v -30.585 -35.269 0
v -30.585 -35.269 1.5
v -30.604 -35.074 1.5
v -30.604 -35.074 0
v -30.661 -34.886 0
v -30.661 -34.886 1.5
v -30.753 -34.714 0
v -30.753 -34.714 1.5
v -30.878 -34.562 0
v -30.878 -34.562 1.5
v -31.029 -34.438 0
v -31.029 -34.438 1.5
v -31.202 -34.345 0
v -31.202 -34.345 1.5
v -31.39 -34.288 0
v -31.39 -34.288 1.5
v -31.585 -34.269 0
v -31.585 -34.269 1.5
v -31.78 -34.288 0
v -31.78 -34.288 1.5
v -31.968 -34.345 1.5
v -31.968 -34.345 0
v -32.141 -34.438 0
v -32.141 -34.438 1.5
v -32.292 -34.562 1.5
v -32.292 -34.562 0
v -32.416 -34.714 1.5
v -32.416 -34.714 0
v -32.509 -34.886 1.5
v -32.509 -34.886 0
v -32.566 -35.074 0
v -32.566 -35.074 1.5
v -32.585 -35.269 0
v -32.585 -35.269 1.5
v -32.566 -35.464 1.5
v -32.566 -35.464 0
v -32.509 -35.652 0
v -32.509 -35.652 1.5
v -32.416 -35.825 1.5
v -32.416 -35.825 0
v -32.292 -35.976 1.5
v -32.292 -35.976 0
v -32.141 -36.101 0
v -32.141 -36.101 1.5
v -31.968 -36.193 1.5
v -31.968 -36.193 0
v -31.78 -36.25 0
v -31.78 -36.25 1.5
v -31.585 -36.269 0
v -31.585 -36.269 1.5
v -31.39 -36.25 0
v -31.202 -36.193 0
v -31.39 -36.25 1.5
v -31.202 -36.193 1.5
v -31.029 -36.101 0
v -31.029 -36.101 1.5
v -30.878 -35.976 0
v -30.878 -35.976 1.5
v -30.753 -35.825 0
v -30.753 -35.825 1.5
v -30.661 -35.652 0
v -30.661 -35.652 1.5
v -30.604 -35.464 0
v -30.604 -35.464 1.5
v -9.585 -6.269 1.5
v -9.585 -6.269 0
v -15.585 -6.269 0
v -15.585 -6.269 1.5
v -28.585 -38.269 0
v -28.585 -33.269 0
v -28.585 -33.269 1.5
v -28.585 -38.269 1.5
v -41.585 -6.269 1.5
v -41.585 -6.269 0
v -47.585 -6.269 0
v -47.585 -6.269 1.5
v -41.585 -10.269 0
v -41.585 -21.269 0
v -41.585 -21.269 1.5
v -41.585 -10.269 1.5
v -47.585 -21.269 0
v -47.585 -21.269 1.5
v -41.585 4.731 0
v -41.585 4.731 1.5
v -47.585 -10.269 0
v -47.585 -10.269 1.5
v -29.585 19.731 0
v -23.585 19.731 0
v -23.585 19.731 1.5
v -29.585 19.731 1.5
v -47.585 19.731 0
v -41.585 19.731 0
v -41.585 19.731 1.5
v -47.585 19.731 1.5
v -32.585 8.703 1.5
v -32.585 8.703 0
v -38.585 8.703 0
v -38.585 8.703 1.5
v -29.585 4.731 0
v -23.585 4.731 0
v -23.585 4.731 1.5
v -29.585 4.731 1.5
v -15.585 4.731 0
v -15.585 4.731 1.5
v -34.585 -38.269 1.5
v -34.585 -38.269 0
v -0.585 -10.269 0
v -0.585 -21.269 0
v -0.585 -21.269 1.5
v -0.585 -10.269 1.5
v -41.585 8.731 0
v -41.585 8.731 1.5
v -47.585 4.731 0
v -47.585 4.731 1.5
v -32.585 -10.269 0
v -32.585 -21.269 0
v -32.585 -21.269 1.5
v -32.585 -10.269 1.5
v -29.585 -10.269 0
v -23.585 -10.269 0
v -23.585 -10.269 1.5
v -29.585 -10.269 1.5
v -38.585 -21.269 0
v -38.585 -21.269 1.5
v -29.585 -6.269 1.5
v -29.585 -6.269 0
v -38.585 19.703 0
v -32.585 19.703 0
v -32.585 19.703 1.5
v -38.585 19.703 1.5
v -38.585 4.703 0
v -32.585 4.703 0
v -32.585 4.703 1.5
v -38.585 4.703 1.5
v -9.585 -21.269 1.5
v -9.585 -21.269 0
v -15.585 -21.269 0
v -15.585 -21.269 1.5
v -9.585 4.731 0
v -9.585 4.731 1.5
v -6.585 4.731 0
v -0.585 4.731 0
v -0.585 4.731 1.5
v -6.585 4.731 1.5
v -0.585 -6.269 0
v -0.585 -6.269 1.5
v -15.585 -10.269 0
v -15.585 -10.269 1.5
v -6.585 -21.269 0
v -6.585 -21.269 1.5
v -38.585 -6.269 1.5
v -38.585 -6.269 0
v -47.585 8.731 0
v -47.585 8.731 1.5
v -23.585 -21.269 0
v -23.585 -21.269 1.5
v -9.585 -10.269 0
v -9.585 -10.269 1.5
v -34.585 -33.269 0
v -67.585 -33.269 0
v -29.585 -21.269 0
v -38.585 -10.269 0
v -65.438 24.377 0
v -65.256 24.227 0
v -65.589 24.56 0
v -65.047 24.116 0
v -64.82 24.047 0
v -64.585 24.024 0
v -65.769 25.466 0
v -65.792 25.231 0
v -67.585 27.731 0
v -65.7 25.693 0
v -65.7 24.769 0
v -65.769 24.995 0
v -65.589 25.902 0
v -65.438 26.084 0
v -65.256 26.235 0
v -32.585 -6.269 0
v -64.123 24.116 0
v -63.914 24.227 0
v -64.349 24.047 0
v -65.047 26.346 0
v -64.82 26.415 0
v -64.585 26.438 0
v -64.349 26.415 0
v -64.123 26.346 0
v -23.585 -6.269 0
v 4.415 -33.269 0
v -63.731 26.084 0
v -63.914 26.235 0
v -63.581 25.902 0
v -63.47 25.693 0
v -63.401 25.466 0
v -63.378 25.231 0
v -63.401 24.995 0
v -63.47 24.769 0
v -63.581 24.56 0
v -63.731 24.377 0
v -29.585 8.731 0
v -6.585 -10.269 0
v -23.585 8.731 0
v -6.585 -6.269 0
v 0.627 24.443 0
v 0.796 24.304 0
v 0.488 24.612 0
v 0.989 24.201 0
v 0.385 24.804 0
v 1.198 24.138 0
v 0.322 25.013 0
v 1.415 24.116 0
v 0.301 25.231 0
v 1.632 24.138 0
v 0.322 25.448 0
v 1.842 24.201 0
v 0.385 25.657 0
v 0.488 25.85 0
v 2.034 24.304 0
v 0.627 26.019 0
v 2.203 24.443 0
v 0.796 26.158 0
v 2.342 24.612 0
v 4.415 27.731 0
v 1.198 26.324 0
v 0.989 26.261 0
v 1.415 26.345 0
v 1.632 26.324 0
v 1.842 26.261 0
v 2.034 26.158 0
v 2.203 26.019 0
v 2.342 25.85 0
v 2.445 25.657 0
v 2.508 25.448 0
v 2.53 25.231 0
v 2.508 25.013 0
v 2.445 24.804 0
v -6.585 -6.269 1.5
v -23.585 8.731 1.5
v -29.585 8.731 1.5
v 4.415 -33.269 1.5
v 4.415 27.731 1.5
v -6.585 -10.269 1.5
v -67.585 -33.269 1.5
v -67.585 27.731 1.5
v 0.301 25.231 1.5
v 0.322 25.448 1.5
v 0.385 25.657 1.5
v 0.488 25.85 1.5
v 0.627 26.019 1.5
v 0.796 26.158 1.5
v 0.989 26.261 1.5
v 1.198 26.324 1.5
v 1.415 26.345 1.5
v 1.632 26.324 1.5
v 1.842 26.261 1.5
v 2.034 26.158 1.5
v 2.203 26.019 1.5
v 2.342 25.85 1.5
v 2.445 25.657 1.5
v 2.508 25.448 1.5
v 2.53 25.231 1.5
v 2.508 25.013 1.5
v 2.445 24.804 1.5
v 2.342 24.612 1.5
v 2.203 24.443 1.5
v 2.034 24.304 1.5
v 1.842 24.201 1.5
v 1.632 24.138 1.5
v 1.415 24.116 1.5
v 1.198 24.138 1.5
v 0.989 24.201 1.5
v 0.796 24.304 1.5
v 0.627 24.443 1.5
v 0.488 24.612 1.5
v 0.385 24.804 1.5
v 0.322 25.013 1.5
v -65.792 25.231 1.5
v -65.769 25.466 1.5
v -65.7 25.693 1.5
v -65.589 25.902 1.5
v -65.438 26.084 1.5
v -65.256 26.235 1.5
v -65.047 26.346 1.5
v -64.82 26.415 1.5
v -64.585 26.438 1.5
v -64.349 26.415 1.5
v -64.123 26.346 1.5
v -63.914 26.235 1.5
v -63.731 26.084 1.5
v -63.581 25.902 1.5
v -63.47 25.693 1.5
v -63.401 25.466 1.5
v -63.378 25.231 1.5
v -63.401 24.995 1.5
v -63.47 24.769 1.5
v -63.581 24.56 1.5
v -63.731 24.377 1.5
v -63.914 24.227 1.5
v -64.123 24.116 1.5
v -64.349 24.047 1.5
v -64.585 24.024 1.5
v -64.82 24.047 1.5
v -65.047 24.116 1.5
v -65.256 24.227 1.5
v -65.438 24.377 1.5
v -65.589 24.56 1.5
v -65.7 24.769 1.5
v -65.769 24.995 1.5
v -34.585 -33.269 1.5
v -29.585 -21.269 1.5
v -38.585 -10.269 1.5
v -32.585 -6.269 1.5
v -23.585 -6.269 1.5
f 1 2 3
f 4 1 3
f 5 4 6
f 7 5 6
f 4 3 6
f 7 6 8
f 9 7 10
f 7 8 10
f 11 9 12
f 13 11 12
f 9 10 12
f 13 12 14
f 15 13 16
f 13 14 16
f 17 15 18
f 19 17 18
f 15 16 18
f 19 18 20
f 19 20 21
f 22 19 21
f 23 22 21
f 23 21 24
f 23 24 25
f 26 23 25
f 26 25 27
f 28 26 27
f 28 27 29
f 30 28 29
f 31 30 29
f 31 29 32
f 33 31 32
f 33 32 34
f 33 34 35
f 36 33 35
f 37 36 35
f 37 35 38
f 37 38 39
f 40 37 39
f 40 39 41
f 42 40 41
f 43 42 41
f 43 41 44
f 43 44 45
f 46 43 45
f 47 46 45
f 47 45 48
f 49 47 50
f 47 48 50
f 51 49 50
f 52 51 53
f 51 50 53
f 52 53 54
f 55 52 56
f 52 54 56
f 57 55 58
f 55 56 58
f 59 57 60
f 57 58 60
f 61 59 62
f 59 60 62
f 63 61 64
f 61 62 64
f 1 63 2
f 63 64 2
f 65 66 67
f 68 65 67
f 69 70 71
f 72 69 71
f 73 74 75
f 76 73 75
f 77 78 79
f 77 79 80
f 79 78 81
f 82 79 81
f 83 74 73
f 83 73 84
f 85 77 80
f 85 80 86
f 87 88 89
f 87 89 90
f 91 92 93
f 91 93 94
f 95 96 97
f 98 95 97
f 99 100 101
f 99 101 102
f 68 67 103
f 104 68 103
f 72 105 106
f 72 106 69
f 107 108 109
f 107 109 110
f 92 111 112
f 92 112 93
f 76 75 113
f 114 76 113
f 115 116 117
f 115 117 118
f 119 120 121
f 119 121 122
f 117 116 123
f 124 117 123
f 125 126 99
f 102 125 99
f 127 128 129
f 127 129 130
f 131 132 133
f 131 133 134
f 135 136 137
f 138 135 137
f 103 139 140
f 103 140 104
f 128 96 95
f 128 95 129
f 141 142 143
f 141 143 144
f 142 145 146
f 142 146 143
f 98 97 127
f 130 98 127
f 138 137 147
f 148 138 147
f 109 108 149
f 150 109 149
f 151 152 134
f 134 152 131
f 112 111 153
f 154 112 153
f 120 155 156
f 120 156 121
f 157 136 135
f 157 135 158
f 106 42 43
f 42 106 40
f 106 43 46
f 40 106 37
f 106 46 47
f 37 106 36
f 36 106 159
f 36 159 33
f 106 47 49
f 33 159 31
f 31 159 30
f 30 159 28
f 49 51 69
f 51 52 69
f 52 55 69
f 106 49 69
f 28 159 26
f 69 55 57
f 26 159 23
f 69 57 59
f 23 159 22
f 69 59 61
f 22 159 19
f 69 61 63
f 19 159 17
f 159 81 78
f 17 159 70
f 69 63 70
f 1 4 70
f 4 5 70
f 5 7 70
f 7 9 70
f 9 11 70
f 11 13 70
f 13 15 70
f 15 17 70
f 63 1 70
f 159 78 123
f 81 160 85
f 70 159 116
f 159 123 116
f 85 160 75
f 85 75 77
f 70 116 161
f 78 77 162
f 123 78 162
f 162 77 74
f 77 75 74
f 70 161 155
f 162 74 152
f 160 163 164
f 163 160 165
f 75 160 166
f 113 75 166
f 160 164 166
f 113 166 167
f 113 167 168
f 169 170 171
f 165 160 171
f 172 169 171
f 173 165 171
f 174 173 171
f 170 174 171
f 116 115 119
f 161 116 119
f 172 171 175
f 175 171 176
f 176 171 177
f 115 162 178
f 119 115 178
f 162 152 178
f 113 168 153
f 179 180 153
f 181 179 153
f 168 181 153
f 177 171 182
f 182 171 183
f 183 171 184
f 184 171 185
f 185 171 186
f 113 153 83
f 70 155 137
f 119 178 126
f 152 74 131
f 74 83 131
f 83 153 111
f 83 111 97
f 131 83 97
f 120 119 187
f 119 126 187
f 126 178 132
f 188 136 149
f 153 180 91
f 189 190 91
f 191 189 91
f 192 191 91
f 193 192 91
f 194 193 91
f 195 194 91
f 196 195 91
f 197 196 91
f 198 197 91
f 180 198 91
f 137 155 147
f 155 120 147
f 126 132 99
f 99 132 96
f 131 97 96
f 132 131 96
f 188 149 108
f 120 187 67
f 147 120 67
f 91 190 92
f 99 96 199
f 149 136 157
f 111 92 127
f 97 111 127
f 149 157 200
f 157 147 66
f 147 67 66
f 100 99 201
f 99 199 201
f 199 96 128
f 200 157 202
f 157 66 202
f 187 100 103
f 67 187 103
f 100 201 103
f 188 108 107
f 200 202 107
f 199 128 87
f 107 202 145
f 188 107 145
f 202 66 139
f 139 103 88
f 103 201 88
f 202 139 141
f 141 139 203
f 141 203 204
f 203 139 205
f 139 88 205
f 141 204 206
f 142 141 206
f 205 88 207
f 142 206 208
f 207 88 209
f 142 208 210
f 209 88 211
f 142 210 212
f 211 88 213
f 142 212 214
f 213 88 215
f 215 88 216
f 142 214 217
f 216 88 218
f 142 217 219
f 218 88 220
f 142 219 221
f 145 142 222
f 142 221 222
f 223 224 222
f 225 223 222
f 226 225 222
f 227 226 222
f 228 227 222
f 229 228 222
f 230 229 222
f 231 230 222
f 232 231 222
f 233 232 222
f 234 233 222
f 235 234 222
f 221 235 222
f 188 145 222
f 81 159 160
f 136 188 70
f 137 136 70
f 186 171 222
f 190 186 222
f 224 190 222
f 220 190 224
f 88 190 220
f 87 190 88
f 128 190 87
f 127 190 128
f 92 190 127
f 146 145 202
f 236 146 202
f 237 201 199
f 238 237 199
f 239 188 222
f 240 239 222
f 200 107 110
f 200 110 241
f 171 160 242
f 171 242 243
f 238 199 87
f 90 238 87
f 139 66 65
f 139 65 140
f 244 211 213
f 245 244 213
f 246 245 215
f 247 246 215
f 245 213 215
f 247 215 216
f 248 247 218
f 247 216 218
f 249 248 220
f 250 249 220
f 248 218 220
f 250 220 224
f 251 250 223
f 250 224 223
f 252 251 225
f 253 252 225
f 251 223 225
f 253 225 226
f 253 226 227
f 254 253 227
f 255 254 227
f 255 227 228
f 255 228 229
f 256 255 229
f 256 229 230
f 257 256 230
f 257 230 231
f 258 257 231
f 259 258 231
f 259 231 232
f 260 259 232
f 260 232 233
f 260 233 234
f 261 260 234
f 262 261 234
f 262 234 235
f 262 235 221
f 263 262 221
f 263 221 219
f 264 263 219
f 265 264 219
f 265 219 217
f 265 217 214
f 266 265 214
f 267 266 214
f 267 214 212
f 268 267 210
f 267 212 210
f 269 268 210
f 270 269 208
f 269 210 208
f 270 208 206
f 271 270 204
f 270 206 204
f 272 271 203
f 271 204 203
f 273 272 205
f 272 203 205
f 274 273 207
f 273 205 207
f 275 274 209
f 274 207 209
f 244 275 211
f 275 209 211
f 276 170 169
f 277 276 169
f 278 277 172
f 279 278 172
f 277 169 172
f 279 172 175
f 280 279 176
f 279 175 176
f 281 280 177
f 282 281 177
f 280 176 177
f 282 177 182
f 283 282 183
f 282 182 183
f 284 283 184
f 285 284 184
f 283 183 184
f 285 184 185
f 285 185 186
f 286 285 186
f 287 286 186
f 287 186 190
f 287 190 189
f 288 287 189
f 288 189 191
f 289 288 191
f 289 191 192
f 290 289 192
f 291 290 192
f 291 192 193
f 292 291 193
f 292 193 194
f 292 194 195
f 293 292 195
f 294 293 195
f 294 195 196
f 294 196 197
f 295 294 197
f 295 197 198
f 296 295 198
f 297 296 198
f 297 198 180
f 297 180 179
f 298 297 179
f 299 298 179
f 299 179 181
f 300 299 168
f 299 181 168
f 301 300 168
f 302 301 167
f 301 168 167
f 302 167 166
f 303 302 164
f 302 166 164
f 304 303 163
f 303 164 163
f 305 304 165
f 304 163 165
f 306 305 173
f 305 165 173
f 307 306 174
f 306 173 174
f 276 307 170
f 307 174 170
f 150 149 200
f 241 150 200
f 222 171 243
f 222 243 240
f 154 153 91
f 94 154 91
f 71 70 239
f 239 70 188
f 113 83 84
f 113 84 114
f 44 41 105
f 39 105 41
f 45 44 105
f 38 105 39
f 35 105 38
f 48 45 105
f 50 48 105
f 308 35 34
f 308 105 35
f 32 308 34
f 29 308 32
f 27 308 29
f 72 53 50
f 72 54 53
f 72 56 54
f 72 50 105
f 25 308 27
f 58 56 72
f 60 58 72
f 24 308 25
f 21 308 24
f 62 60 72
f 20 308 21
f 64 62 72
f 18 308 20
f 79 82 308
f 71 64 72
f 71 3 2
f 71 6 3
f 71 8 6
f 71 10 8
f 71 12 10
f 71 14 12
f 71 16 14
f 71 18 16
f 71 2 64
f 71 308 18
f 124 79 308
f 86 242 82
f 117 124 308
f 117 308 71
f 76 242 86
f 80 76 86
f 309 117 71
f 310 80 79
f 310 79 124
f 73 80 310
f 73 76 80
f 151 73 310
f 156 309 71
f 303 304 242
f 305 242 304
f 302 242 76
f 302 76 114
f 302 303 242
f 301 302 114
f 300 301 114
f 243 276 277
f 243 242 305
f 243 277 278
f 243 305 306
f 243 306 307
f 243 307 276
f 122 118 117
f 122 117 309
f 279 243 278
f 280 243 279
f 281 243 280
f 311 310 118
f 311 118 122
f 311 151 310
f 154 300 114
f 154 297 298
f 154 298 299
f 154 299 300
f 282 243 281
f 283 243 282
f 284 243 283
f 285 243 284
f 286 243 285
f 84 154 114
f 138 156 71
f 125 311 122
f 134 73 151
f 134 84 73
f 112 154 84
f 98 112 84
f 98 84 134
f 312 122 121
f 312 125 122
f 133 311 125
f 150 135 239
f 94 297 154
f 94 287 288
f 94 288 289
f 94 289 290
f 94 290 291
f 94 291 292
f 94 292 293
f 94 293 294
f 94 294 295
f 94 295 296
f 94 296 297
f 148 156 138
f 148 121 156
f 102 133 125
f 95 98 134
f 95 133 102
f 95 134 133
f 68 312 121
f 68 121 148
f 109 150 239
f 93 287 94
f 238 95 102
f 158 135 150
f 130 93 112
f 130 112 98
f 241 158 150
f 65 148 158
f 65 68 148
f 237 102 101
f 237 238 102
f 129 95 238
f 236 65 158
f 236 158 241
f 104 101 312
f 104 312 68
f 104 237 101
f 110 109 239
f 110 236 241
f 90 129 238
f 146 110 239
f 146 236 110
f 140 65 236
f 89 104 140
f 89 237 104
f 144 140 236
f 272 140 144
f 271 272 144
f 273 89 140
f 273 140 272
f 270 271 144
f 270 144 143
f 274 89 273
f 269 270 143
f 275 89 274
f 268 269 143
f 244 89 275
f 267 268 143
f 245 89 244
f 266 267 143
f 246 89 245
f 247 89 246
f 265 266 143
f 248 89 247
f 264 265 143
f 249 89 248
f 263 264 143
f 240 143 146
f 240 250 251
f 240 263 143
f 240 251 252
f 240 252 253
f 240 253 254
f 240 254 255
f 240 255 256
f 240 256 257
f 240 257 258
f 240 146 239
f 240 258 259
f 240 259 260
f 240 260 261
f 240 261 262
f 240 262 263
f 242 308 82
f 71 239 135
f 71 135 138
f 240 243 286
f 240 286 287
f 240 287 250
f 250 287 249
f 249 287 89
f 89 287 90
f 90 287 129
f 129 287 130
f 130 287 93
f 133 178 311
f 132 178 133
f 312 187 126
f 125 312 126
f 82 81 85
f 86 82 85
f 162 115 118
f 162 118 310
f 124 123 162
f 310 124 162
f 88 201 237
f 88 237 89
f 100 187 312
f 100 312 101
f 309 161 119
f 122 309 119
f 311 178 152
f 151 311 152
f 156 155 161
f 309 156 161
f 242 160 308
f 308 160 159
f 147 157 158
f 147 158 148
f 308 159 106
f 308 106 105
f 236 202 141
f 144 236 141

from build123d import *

# Parameters (mm, degrees)
ESQUISSE1_W             = 72
ESQUISSE1_H             = 61
BOSS_EXTRU_1_DEPTH      = 1.5
ESQUISSE2_R             = 1.114499423
ESQUISSE2_R_2           = 1.207075002
ENL_V_MAT_EXTRU_1_DEPTH = 2.5
ESQUISSE4_W             = 6
ESQUISSE4_H             = 11
ENL_V_MAT_EXTRU_2_DEPTH = 2.5
ESQUISSE4_3_W           = 6
ESQUISSE4_3_H           = 11
ESQUISSE4_3_H_2         = 10.972423644
ENL_V_MAT_EXTRU_3_DEPTH = 2.5
ESQUISSE5_W             = 6
ESQUISSE5_H             = 1.5
BOSS_EXTRU_2_DEPTH      = 5
ESQUISSE6_R             = 1
ENL_V_MAT_EXTRU_4_DEPTH = 6


with BuildPart() as part:
    # Esquisse1 → Boss.-Extru.1 (new body)
    with BuildSketch(Plane.XY):
        with Locations((-31.584952854, -2.769073276)):
            Rectangle(ESQUISSE1_W, ESQUISSE1_H)
    extrude(amount=BOSS_EXTRU_1_DEPTH)

    # Esquisse2 → Enl_v. mat.-Extru.1 (cut, through all)
    with BuildSketch(Plane(origin=(0, 0, 0), x_dir=(-1, 0, 0), z_dir=(0, 0, -1))):
        with Locations((-1.415047146, 25.230926724)):
            Circle(ESQUISSE2_R)
        with Locations((64.584952854, 25.230926724)):
            Circle(ESQUISSE2_R_2)
    extrude(amount=-ENL_V_MAT_EXTRU_1_DEPTH, mode=Mode.SUBTRACT)

    # Esquisse4 → Enl_v. mat.-Extru.2 (cut, through all)
    with BuildSketch(Plane(origin=(0, 0, 0), x_dir=(-1, 0, 0), z_dir=(0, 0, -1))):
        with Locations((44.584952854, -15.769073276)):
            Rectangle(ESQUISSE4_W, ESQUISSE4_H)
        with Locations((35.584952854, -15.769073276)):
            Rectangle(ESQUISSE4_W, ESQUISSE4_H)
    extrude(amount=-ENL_V_MAT_EXTRU_2_DEPTH, mode=Mode.SUBTRACT)

    # Esquisse4_3 → Enl_v. mat.-Extru.3 (cut, through all)
    with BuildSketch(Plane(origin=(0, 0, 0), x_dir=(-1, 0, 0), z_dir=(0, 0, -1))):
        with Locations((26.584952854, -15.769073276)):
            Rectangle(ESQUISSE4_3_W, ESQUISSE4_3_H)
        with Locations((26.584952854, 14.230926724)):
            Rectangle(ESQUISSE4_3_W, ESQUISSE4_3_H)
        with Locations((44.584952854, -15.769073276)):
            Rectangle(ESQUISSE4_3_W, ESQUISSE4_3_H)
        with Locations((35.584952854, -15.769073276)):
            Rectangle(ESQUISSE4_3_W, ESQUISSE4_3_H)
        with Locations((44.584952854, -0.769073276)):
            Rectangle(ESQUISSE4_3_W, ESQUISSE4_3_H)
        with Locations((35.584952854, -0.782861454)):
            Rectangle(ESQUISSE4_3_W, ESQUISSE4_3_H_2)
        with Locations((26.584952854, -0.769073276)):
            Rectangle(ESQUISSE4_3_W, ESQUISSE4_3_H)
        with Locations((35.584952854, 14.203350368)):
            Rectangle(ESQUISSE4_3_W, ESQUISSE4_3_H)
        with Locations((44.584952854, 14.230926724)):
            Rectangle(ESQUISSE4_3_W, ESQUISSE4_3_H)
        with Locations((12.584952854, -15.769073276)):
            Rectangle(ESQUISSE4_3_W, ESQUISSE4_3_H)
        with Locations((3.584952854, -15.769073276)):
            Rectangle(ESQUISSE4_3_W, ESQUISSE4_3_H)
        with Locations((12.584952854, -0.769073276)):
            Rectangle(ESQUISSE4_3_W, ESQUISSE4_3_H)
        with Locations((3.584952854, -0.769073276)):
            Rectangle(ESQUISSE4_3_W, ESQUISSE4_3_H)
    extrude(amount=-ENL_V_MAT_EXTRU_3_DEPTH, mode=Mode.SUBTRACT)

    # Esquisse5 → Boss.-Extru.2 (add)
    with BuildSketch(Plane.XZ.offset(33.269073276)):
        with Locations((-31.584952854, 0.75)):
            Rectangle(ESQUISSE5_W, ESQUISSE5_H)
    extrude(amount=BOSS_EXTRU_2_DEPTH)

    # Esquisse6 → Enl_v. mat.-Extru.4 (cut)
    with BuildSketch(Plane.XY.offset(1.5)):
        with Locations((-31.584952854, -35.269073276)):
            Circle(ESQUISSE6_R)
    extrude(amount=-ENL_V_MAT_EXTRU_4_DEPTH, mode=Mode.SUBTRACT)


solid = part.part
